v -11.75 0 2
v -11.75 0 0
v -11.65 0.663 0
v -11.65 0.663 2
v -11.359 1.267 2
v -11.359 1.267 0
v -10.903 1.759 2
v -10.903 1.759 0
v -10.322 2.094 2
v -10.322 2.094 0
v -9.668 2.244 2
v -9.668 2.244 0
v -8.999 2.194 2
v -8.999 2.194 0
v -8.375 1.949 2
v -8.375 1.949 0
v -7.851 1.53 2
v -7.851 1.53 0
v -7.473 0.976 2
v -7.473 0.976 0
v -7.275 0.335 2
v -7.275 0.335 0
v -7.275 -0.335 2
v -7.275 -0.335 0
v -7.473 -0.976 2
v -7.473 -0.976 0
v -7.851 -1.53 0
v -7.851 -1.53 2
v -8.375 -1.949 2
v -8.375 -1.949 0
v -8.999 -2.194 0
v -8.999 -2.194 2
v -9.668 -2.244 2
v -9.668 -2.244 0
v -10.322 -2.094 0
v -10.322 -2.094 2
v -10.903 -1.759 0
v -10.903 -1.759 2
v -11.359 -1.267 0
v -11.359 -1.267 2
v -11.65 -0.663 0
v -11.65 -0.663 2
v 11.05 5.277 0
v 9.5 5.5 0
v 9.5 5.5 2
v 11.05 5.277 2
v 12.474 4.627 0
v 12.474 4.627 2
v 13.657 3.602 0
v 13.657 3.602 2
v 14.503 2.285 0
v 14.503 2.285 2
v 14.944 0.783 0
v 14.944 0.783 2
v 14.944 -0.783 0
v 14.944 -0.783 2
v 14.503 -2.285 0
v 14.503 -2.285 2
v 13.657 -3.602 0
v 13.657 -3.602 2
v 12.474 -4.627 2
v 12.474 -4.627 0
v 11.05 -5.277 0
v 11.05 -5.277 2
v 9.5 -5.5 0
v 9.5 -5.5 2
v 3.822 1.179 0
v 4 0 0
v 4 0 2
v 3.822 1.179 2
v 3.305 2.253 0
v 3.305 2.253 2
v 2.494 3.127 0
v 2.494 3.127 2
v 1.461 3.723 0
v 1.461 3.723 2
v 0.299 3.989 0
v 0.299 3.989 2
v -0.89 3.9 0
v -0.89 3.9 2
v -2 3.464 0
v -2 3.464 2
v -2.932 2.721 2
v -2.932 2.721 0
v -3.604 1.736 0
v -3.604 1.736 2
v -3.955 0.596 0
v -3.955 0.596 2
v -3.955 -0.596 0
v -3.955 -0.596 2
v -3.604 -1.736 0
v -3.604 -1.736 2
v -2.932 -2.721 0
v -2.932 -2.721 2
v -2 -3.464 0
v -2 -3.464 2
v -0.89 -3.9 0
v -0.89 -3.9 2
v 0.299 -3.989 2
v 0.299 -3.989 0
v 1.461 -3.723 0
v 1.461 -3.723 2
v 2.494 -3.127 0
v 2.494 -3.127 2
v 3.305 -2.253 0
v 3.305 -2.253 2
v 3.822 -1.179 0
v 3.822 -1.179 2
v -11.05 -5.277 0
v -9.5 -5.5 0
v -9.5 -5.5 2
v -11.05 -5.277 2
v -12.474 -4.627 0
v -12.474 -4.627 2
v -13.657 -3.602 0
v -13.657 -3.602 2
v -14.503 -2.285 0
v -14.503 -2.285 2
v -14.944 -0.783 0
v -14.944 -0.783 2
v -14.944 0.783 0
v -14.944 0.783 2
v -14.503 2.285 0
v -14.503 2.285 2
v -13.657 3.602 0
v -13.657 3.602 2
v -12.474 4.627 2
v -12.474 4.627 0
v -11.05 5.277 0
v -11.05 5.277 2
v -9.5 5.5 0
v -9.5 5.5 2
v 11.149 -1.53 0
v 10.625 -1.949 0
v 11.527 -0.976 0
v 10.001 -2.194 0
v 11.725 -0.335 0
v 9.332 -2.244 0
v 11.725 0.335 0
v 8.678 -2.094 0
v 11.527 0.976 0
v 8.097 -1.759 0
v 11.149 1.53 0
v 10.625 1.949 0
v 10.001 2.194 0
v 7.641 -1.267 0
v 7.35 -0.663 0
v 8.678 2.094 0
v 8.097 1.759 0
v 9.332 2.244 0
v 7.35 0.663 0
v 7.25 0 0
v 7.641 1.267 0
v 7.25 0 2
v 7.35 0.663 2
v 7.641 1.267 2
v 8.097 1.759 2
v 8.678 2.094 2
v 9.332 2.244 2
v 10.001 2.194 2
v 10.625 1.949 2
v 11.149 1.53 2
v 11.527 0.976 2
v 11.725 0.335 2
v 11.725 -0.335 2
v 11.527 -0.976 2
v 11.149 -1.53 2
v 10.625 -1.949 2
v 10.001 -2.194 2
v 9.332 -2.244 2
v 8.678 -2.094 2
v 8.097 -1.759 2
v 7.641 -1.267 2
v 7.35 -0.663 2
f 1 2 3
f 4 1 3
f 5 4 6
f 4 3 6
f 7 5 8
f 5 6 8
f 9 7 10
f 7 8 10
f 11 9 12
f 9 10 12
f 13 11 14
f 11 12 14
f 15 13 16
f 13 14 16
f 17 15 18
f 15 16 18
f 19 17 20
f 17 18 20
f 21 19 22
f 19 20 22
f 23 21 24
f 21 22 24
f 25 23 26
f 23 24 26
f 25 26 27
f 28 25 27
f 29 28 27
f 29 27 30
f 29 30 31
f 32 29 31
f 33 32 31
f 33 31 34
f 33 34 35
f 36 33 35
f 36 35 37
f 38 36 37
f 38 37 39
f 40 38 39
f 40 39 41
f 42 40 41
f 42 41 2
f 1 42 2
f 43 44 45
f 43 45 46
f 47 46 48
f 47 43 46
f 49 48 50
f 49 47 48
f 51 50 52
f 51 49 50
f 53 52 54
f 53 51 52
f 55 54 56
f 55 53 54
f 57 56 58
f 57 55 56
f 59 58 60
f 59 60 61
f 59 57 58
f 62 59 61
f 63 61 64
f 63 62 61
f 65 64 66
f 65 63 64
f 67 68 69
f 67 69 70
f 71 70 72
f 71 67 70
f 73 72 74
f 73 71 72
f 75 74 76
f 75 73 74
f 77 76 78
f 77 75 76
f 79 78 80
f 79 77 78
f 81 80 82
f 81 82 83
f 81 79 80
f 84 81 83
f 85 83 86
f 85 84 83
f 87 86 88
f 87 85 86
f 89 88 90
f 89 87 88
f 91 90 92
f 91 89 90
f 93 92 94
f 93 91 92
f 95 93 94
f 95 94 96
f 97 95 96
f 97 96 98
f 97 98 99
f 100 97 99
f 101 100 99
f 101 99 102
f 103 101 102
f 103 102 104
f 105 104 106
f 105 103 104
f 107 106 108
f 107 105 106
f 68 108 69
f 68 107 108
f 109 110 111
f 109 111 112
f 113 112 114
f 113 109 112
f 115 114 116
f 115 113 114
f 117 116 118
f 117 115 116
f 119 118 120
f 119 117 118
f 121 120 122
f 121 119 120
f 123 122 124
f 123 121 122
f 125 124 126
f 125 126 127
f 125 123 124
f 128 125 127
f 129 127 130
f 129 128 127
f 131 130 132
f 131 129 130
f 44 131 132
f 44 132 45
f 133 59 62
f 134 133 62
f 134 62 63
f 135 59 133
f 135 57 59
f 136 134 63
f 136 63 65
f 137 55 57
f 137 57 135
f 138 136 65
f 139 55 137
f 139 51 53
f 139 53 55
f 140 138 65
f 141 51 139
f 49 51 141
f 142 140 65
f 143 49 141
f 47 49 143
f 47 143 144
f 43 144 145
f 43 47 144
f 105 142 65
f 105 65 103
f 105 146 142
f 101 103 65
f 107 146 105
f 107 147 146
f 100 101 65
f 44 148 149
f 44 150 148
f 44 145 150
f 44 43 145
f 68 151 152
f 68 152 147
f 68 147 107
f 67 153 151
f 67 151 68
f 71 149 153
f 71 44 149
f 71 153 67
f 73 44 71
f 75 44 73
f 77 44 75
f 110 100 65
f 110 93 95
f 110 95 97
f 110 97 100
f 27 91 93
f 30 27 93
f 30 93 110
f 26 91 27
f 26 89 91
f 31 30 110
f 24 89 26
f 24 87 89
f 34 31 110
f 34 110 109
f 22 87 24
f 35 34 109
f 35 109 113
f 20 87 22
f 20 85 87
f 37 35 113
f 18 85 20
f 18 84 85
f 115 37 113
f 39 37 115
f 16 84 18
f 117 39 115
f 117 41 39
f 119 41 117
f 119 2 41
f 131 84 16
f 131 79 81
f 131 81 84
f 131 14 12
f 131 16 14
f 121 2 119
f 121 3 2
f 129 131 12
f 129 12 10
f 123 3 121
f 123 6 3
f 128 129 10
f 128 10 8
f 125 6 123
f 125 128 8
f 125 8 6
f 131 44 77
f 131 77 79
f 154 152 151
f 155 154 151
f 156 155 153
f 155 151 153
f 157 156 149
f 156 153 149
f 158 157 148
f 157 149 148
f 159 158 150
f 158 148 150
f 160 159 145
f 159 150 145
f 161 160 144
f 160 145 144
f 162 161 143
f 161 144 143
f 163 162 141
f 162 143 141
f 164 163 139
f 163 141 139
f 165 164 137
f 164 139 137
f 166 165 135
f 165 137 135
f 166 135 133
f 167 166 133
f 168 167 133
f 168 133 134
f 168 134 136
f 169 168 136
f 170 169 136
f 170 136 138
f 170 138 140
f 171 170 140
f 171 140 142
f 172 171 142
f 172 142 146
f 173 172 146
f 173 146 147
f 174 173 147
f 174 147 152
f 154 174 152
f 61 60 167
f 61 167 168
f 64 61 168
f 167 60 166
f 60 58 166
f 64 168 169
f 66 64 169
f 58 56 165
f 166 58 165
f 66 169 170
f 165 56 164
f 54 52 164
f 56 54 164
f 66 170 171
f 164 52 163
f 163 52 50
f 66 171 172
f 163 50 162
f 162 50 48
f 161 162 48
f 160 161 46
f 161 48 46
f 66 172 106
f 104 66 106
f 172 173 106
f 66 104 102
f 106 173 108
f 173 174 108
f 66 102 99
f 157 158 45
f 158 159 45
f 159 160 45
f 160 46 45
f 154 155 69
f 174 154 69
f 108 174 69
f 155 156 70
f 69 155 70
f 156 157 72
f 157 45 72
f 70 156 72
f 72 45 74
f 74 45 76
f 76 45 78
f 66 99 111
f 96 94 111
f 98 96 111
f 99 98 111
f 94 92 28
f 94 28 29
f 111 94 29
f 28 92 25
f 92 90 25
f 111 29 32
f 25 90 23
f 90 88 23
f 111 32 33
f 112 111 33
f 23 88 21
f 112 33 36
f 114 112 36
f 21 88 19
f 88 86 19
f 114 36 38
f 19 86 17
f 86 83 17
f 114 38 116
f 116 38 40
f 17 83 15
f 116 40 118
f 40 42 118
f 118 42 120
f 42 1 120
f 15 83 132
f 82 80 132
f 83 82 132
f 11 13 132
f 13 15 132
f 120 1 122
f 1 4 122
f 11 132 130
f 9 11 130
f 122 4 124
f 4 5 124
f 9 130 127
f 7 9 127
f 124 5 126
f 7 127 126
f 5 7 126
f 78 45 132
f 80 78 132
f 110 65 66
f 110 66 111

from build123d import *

# Parameters (mm, degrees)
SKETCH1_R            = 4
BOSS_EXTRUDE1_DEPTH  = 2
M4_CLEARANCE_HOLE1_D = 4.5


with BuildPart() as part:
    # Sketch1 → Boss-Extrude1 (new body)
    with BuildSketch(Plane.XY):
        with BuildLine():
            Line((-9.5, 5.5), (9.5, 5.5))
            ThreePointArc((9.5, 5.5), (15, 0), (9.5, -5.5))
            Line((9.5, -5.5), (-9.5, -5.5))
            ThreePointArc((-9.5, -5.5), (-15, 0), (-9.5, 5.5))
        make_face()
        Circle(SKETCH1_R, mode=Mode.SUBTRACT)
    extrude(amount=BOSS_EXTRUDE1_DEPTH)

    # M4 Clearance Hole1 (through all)
    with Locations(Plane.XY.offset(2)):
        with Locations((-9.5, 0), (9.5, 0)):
            Hole(M4_CLEARANCE_HOLE1_D / 2)


solid = part.part
